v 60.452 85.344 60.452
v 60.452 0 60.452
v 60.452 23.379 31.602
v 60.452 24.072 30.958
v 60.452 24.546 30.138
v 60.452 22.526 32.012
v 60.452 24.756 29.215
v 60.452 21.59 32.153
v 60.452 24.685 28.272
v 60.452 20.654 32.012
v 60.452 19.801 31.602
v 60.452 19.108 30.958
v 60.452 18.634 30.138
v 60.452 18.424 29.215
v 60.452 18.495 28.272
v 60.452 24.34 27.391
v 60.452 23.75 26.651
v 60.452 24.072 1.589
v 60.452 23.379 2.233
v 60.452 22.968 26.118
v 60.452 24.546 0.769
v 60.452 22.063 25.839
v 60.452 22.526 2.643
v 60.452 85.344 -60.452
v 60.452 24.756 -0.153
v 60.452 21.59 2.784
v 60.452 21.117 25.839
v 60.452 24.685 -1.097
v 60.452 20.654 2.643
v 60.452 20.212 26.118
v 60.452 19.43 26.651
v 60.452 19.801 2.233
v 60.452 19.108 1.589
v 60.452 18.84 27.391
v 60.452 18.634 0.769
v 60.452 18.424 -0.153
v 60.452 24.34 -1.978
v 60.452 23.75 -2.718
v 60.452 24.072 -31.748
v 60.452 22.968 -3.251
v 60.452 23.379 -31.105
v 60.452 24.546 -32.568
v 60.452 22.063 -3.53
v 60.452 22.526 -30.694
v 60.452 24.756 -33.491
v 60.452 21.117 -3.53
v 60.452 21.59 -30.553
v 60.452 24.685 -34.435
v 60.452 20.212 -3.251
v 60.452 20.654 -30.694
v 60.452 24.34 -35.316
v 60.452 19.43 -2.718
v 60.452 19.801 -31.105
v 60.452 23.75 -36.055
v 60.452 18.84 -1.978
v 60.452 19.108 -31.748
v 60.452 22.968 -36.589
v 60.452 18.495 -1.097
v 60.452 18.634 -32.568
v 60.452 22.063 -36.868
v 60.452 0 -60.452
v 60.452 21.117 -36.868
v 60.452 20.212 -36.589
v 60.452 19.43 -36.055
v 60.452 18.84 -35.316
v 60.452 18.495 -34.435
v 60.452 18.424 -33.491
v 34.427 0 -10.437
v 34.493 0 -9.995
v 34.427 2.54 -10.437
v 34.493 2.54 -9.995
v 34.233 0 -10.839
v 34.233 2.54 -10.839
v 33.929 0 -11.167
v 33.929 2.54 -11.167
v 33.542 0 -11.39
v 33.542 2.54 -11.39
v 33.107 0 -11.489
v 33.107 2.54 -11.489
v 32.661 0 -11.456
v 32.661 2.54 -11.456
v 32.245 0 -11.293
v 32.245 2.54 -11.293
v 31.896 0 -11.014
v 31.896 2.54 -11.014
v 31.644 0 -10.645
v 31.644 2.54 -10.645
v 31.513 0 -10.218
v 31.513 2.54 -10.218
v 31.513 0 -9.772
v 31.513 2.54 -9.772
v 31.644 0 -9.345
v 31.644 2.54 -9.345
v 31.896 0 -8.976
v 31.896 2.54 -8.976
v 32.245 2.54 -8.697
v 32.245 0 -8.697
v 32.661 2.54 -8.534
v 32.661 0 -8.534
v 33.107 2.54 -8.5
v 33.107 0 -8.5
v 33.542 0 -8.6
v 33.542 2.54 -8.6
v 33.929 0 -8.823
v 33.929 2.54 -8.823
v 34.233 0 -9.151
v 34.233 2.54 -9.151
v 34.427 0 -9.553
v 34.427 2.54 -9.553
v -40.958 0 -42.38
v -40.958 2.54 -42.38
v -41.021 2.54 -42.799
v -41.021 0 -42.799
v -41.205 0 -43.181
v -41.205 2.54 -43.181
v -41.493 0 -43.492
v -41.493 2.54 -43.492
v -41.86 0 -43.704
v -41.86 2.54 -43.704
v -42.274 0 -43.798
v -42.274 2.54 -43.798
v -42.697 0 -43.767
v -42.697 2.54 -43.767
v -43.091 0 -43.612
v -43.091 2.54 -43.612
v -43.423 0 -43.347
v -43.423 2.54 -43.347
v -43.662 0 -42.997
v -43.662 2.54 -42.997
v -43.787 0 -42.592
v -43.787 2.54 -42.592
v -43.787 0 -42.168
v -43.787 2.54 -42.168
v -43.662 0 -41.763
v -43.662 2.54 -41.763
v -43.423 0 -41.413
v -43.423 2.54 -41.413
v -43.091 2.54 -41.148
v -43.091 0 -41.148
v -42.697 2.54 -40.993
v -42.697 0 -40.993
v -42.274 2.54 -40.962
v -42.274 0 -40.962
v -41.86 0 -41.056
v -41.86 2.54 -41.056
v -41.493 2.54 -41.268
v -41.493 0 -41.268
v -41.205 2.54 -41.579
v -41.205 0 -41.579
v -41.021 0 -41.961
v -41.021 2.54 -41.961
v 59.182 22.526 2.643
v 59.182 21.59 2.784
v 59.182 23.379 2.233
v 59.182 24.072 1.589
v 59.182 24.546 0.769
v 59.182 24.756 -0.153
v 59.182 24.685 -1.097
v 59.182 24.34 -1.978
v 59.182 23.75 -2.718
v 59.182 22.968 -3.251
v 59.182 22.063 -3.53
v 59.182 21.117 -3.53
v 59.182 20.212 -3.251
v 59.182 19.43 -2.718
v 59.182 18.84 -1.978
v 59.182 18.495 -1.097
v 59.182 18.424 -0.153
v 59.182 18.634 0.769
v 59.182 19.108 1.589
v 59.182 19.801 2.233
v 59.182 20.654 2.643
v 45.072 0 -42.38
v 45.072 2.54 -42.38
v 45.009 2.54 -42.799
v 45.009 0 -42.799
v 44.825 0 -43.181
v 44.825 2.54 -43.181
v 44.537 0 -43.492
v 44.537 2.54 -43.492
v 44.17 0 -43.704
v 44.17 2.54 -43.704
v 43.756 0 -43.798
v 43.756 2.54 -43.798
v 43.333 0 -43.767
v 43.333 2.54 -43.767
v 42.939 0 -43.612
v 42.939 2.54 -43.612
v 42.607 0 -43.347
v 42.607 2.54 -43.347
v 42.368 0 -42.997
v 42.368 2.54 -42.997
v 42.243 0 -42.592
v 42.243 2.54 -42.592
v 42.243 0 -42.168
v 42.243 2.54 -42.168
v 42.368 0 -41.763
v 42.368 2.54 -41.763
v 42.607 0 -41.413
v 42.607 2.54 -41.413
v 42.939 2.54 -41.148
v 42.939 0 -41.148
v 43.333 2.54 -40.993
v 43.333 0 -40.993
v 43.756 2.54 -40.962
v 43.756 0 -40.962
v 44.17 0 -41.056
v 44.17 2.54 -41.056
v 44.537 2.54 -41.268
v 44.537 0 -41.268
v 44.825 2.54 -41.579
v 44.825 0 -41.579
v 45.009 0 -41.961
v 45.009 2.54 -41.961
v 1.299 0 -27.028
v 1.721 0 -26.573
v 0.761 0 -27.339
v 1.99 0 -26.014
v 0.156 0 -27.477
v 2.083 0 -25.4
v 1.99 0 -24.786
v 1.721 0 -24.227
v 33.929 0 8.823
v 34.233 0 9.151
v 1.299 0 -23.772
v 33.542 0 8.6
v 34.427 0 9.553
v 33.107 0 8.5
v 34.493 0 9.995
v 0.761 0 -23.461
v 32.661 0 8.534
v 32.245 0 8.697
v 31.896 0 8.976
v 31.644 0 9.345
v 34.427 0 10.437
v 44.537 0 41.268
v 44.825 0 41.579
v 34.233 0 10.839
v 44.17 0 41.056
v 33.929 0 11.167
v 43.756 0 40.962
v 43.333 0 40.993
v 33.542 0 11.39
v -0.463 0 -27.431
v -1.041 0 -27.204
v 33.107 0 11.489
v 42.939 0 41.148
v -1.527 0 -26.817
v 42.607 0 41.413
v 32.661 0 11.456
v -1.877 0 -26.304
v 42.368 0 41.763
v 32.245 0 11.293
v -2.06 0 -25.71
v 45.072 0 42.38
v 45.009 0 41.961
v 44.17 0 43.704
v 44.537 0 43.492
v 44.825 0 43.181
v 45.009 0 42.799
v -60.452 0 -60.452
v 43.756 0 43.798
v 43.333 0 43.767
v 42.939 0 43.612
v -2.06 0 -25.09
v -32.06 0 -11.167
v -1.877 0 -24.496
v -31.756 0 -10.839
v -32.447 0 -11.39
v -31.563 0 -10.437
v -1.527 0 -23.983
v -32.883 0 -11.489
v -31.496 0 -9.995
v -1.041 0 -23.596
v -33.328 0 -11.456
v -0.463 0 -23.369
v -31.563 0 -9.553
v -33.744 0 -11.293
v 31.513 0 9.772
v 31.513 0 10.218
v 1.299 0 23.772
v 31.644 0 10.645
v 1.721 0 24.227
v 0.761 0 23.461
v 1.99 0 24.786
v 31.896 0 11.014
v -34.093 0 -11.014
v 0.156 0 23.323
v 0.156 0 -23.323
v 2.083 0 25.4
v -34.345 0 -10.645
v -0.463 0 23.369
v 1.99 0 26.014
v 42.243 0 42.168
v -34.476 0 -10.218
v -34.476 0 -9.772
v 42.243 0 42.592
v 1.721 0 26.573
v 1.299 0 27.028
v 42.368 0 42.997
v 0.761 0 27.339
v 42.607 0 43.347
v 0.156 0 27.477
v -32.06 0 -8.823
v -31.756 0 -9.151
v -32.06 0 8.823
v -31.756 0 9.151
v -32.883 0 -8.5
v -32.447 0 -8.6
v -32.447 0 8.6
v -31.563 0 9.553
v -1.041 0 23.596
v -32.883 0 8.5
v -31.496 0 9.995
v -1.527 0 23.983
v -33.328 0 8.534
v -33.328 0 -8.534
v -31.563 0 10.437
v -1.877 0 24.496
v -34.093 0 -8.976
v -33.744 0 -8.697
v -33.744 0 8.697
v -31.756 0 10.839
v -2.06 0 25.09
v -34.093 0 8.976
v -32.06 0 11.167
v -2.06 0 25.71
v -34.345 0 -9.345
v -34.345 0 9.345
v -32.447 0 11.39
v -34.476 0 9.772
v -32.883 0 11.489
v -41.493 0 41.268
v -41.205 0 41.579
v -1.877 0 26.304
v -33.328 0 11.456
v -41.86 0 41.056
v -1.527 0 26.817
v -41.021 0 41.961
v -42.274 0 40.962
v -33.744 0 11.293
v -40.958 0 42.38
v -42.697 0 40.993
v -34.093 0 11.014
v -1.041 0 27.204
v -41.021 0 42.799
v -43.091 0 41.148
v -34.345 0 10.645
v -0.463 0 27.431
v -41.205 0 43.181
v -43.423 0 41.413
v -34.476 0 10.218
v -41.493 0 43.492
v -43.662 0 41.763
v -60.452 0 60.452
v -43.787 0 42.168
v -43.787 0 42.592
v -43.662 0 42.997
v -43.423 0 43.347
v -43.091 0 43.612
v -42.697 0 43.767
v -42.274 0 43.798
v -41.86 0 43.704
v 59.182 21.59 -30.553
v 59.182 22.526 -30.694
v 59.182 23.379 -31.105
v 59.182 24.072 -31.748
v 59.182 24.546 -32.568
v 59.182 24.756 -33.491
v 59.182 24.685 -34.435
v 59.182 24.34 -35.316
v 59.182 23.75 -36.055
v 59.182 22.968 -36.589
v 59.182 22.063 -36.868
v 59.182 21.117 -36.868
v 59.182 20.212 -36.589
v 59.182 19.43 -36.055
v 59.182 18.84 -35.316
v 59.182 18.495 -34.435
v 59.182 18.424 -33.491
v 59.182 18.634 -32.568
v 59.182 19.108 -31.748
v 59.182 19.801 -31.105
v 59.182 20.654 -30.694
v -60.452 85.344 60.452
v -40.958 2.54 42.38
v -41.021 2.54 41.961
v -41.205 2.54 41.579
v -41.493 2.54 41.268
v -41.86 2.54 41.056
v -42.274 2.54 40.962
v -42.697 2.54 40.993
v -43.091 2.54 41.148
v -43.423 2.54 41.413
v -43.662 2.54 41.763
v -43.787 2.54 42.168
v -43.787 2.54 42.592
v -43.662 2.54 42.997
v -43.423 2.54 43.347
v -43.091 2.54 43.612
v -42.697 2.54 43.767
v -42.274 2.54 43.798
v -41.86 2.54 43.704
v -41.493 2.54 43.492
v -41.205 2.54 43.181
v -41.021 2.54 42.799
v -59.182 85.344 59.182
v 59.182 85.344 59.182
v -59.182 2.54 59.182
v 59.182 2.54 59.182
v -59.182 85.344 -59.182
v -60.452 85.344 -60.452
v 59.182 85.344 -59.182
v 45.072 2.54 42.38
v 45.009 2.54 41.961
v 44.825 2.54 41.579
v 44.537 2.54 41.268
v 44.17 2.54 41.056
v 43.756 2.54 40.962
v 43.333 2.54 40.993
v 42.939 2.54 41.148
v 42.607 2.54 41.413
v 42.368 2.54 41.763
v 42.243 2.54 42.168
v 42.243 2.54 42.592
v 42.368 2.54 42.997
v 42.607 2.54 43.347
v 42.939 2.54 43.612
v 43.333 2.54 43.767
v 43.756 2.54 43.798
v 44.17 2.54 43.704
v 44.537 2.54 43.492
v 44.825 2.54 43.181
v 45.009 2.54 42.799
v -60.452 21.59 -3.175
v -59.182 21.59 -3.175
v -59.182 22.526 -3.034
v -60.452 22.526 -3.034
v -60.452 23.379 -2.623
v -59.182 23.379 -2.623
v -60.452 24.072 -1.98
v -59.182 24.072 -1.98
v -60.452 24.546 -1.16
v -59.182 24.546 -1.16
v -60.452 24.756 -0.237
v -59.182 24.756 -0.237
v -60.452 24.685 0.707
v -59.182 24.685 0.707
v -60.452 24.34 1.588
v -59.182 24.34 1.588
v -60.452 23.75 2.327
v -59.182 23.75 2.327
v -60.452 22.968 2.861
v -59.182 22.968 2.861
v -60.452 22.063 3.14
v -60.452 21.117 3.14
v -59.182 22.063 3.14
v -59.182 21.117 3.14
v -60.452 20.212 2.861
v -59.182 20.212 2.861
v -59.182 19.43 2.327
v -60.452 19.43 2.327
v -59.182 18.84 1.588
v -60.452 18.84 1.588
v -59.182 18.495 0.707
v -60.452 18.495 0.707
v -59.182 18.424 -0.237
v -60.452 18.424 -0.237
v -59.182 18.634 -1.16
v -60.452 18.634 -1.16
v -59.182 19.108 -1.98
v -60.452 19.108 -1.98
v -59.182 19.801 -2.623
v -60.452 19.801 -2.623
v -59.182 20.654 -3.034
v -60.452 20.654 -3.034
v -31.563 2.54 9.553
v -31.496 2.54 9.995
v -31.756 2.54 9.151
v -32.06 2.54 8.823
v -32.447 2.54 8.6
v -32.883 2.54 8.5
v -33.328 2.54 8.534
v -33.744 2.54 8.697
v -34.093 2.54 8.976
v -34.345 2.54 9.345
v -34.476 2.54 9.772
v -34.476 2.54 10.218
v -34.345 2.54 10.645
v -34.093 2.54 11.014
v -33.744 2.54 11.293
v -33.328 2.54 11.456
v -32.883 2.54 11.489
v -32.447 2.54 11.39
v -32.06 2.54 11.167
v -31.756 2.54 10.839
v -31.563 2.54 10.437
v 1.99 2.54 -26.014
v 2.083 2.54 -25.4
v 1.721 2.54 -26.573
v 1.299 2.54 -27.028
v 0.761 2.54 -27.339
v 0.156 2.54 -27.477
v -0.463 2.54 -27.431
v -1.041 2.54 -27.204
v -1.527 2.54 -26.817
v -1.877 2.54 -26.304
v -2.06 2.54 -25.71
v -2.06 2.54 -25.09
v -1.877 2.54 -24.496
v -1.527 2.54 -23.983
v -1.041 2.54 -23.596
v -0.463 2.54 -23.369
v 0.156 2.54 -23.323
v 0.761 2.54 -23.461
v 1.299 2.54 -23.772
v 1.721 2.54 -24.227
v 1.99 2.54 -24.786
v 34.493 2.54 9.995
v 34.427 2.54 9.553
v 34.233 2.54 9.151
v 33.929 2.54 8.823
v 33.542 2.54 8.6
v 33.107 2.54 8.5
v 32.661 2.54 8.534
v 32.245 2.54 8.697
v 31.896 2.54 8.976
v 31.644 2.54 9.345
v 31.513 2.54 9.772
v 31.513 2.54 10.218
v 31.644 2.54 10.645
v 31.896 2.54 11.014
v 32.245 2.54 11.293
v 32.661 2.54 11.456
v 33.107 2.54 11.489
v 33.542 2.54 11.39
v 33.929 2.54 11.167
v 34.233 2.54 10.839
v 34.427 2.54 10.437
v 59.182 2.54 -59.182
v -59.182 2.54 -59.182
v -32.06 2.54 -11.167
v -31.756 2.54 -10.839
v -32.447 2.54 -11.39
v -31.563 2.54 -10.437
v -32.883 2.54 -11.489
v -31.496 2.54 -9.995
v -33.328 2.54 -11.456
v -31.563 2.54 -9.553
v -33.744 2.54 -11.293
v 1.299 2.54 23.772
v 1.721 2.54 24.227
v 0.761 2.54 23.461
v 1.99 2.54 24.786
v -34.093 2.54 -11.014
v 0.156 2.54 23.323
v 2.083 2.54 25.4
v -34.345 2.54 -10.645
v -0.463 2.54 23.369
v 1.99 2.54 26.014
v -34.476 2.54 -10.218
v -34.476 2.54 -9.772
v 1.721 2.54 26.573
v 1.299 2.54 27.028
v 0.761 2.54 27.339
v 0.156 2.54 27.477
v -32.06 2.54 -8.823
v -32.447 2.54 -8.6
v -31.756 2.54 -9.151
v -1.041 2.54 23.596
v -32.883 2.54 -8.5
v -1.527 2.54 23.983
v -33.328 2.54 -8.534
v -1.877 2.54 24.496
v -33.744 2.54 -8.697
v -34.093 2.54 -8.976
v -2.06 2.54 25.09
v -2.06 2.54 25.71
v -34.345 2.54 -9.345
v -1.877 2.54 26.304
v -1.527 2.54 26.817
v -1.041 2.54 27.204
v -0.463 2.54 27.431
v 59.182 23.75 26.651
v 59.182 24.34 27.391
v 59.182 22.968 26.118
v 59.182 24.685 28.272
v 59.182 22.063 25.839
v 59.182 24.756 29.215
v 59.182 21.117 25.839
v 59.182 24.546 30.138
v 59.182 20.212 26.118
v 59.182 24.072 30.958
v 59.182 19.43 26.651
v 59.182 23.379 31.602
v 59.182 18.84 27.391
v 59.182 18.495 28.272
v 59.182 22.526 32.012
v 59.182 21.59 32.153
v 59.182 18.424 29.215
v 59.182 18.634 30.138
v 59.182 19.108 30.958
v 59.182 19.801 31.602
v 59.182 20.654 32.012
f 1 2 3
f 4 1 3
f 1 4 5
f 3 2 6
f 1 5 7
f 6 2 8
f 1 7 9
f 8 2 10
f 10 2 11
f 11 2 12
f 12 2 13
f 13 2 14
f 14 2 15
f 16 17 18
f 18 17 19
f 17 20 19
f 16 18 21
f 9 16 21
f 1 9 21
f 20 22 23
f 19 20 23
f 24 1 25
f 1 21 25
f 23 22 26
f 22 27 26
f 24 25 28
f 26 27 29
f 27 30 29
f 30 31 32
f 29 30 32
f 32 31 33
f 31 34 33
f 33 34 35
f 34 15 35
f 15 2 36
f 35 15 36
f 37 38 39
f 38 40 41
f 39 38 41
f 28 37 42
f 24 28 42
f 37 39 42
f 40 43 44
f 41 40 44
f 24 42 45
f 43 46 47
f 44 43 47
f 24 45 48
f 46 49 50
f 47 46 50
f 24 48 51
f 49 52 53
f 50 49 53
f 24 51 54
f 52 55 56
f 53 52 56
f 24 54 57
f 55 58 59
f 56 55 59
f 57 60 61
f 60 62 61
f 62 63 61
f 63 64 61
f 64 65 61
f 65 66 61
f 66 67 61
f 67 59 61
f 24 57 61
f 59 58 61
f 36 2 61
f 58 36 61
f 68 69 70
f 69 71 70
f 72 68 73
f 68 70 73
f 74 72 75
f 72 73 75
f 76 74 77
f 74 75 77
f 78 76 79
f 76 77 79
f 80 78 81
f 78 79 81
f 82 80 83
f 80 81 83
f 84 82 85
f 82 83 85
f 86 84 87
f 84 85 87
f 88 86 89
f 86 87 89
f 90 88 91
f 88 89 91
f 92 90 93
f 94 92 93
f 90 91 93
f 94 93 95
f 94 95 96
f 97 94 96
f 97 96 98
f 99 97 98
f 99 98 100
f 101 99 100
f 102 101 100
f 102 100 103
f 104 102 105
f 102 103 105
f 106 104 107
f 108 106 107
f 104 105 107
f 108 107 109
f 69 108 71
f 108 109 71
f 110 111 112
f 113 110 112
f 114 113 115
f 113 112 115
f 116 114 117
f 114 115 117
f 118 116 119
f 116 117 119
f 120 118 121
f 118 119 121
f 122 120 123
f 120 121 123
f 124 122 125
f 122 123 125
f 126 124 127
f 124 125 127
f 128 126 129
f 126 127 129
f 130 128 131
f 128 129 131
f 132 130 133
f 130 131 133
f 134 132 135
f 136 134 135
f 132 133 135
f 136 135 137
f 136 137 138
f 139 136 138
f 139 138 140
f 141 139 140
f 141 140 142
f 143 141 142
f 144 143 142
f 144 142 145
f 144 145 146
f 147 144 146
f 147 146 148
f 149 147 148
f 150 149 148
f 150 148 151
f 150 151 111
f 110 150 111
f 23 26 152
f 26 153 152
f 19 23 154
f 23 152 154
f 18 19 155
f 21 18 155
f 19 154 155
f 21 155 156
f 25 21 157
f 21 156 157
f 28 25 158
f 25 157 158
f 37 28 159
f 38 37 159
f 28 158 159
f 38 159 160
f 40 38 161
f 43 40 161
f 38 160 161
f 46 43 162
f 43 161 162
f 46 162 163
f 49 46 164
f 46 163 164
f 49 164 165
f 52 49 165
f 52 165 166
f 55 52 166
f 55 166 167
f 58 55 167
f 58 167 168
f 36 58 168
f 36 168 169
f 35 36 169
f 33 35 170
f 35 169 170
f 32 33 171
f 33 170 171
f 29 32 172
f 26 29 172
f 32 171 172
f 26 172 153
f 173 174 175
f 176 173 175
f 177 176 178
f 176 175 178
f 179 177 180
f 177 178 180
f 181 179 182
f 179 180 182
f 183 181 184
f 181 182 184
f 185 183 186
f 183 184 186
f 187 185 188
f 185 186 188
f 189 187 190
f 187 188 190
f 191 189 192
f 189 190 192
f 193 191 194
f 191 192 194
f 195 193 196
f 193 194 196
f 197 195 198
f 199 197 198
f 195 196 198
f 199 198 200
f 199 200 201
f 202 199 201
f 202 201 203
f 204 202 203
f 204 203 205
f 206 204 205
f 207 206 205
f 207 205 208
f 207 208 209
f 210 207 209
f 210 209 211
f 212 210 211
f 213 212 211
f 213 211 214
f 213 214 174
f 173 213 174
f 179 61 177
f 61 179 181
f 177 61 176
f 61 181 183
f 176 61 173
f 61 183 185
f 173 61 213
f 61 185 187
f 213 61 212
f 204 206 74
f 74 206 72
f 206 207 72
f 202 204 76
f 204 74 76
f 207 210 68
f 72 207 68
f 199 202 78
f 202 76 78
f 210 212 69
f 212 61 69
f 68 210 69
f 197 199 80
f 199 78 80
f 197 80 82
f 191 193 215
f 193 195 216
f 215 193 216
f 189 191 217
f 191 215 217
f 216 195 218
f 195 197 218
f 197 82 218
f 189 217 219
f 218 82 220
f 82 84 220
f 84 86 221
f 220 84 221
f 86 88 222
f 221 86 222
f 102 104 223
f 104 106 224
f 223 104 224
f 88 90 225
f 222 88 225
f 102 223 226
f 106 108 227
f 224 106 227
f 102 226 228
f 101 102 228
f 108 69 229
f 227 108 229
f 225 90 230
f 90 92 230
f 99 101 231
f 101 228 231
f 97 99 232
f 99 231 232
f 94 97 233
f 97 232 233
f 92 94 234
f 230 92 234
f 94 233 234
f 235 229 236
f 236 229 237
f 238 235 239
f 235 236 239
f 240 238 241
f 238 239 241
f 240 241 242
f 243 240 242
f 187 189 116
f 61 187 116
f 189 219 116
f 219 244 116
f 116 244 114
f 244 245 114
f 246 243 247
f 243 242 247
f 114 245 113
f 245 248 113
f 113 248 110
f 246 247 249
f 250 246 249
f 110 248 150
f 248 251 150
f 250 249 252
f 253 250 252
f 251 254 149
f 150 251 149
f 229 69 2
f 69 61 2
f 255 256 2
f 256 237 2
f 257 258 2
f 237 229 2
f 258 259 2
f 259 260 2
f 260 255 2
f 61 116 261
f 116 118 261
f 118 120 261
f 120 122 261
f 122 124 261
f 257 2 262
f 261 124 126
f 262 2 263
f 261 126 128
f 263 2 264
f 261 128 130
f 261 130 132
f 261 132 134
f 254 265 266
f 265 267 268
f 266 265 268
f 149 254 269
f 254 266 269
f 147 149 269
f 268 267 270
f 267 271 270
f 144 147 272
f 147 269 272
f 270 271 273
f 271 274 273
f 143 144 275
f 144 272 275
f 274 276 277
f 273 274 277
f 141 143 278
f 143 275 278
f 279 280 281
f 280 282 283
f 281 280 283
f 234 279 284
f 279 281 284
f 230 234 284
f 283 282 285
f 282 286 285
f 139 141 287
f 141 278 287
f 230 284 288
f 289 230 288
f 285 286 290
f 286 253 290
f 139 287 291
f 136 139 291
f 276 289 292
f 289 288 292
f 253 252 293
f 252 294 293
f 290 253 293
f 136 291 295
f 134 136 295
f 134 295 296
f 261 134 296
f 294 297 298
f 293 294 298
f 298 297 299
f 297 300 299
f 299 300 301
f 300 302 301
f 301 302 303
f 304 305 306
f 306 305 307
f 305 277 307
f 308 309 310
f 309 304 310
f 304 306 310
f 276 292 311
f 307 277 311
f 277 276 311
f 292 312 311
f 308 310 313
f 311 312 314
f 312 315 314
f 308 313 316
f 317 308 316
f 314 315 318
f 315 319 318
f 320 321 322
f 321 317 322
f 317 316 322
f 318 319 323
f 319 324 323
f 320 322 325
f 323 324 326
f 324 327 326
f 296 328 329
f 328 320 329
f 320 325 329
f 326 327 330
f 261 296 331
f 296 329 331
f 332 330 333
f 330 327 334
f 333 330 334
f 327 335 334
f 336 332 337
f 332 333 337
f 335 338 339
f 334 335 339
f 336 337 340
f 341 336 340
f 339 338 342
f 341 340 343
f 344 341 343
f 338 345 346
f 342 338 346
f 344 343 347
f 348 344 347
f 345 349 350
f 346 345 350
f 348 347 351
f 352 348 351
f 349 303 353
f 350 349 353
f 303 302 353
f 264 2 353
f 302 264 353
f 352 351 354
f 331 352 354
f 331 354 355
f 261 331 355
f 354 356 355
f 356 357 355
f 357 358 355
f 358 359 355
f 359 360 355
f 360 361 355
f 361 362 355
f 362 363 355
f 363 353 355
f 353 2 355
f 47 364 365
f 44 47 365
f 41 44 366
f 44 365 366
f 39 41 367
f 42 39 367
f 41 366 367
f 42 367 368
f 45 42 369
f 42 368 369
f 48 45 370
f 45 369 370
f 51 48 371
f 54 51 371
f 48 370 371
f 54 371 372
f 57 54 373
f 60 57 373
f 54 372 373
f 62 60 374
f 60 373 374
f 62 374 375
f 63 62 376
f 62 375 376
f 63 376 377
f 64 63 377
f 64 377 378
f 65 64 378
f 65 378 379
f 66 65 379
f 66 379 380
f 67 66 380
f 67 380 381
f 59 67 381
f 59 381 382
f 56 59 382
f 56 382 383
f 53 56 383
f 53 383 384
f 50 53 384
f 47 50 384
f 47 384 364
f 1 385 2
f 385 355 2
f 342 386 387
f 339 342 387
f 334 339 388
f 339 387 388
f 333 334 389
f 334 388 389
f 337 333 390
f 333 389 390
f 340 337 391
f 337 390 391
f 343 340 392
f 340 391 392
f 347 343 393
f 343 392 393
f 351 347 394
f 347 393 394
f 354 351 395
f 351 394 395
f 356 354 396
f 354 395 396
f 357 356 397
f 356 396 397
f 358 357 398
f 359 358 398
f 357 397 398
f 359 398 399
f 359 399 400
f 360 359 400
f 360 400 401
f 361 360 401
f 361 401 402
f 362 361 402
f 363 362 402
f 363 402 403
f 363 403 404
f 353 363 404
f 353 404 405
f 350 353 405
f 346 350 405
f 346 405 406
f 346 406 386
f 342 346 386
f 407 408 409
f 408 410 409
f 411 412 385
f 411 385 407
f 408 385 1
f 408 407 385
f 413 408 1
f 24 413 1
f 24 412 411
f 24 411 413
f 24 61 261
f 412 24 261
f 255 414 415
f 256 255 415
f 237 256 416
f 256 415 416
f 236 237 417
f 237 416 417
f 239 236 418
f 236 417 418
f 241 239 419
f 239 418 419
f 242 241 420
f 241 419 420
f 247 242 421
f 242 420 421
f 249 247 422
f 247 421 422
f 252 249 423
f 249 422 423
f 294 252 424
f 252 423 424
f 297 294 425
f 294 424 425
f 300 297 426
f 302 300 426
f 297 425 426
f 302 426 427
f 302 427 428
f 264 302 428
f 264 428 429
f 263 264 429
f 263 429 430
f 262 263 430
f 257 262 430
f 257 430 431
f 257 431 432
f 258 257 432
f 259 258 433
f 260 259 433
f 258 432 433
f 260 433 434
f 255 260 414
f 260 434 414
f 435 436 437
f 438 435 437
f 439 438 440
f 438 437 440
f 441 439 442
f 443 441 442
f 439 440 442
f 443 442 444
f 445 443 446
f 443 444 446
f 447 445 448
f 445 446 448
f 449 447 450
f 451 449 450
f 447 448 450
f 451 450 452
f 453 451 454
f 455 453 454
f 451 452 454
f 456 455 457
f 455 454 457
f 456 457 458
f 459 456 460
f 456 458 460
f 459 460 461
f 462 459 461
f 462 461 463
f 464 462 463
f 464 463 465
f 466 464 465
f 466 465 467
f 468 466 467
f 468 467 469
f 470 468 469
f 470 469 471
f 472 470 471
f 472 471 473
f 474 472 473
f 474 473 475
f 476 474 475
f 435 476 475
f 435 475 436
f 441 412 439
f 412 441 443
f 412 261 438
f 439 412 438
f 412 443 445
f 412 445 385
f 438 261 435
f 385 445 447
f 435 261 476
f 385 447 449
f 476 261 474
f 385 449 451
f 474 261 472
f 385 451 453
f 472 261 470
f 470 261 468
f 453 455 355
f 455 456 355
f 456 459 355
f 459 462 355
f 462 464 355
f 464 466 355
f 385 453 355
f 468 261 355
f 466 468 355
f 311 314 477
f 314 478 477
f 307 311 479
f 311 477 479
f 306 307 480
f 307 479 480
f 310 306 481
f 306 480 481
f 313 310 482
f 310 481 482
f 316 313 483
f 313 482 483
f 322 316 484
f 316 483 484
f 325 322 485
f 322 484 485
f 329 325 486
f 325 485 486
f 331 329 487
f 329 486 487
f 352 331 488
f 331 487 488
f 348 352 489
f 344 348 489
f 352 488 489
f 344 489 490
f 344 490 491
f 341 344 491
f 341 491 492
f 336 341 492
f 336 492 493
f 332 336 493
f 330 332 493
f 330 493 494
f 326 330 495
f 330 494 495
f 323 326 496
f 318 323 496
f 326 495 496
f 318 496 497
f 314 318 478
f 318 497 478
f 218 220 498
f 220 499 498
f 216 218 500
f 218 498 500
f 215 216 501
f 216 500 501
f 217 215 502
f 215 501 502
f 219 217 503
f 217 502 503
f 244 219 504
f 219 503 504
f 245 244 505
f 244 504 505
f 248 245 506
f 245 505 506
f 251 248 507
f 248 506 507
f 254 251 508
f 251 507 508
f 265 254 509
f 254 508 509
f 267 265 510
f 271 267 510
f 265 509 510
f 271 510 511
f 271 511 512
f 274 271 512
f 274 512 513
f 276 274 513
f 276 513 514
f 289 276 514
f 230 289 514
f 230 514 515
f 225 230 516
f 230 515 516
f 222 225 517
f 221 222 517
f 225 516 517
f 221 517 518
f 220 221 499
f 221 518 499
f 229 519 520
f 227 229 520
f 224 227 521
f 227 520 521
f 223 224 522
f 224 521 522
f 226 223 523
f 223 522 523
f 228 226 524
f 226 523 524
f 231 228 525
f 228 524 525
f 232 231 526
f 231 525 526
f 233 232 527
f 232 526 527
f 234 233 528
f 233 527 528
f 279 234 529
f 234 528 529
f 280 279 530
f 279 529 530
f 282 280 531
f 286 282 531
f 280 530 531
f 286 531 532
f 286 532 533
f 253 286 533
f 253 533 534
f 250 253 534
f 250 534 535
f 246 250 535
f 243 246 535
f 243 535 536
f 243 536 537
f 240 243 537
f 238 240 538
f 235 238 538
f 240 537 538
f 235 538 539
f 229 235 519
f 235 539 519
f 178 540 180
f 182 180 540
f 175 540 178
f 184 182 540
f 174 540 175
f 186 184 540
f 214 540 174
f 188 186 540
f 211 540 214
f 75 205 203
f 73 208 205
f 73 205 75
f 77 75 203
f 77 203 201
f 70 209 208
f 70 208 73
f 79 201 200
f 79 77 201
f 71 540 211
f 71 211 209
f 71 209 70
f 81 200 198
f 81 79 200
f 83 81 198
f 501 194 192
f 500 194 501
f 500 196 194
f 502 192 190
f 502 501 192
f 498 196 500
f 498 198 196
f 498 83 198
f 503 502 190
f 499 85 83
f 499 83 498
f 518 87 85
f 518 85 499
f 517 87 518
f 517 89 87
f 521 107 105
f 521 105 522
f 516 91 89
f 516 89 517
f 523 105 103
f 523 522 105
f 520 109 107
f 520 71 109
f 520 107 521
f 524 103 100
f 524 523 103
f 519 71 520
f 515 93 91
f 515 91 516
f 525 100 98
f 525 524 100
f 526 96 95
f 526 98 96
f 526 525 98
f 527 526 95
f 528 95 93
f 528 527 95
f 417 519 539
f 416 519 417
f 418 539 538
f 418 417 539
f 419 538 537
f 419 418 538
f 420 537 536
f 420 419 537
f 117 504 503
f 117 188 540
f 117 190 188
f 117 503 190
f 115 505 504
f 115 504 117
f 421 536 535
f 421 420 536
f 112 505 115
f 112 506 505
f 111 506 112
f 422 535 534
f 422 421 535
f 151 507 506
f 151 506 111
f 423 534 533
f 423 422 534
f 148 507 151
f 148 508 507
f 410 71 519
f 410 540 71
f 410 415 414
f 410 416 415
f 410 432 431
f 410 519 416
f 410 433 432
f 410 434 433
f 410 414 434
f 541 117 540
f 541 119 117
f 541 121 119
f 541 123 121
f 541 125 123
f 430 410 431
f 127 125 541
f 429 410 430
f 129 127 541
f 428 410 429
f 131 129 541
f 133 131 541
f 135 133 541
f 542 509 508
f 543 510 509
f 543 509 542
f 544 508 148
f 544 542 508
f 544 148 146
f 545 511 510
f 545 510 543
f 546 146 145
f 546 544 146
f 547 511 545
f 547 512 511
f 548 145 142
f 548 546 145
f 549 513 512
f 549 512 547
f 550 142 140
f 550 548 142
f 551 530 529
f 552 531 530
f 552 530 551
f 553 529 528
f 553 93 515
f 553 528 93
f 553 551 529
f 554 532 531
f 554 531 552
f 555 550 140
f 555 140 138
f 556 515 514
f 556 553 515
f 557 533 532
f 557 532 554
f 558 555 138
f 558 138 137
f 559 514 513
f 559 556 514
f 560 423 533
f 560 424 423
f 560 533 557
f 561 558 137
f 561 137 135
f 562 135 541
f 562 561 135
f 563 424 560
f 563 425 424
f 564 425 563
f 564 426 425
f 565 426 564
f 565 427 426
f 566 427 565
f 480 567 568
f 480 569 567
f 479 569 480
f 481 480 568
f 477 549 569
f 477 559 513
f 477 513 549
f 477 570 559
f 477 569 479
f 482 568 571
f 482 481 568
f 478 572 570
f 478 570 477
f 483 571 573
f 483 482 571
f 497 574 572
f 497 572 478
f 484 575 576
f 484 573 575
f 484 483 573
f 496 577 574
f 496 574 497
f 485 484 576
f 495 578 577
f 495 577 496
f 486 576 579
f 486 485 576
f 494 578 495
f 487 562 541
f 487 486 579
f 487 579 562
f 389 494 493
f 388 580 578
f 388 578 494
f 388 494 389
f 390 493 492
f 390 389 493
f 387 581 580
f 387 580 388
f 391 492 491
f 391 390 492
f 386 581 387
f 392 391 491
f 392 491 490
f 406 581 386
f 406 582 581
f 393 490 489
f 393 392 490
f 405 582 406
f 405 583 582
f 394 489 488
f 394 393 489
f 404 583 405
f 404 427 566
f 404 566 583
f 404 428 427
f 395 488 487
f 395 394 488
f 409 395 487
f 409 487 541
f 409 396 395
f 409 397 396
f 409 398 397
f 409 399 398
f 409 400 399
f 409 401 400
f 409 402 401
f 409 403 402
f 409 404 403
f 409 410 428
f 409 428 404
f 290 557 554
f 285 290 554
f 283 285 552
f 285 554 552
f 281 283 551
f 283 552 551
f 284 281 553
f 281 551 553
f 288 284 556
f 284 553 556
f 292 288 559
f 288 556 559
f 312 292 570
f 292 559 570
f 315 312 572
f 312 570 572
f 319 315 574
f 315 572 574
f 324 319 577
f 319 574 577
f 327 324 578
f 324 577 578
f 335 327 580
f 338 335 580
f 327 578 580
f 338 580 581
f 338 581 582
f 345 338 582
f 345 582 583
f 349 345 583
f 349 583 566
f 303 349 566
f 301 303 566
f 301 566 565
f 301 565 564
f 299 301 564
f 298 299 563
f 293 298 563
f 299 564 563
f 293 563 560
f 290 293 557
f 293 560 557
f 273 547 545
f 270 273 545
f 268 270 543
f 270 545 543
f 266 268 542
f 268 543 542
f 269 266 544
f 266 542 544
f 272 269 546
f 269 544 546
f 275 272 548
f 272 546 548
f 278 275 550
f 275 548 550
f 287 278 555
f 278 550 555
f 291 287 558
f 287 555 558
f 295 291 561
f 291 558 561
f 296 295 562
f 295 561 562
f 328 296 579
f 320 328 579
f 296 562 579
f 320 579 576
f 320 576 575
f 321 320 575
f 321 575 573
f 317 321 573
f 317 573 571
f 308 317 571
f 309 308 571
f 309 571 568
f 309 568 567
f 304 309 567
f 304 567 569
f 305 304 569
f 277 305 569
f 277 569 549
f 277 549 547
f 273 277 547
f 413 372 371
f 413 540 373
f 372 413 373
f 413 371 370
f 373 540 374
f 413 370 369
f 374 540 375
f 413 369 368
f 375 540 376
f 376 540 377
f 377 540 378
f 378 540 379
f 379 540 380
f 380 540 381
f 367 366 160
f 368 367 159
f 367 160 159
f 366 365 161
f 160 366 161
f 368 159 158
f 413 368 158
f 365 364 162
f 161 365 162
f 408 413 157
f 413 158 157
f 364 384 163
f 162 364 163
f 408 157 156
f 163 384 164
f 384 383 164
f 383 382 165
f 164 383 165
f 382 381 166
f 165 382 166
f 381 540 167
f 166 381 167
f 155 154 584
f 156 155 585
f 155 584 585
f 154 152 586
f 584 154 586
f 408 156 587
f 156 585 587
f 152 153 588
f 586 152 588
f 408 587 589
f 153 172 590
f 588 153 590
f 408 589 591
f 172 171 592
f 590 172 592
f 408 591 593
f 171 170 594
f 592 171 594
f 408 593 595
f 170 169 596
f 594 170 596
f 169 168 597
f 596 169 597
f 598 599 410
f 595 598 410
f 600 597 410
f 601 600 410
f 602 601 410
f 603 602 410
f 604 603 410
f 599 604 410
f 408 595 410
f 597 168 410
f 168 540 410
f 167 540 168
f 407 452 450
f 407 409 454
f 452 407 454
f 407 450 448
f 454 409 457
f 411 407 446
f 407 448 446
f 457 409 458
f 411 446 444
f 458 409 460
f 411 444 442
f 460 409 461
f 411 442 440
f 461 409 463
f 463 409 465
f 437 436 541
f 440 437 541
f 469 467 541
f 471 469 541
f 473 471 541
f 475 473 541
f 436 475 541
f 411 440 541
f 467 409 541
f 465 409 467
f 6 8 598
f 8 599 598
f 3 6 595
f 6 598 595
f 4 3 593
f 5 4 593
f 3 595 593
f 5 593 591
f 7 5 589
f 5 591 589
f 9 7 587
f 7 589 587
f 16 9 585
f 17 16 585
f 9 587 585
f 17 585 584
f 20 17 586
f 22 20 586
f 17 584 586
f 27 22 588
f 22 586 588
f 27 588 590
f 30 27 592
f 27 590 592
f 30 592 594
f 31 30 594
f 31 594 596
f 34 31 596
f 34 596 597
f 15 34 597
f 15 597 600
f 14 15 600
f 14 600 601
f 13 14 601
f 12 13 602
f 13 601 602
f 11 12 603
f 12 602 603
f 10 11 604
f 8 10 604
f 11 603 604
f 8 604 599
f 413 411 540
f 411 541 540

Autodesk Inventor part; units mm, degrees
ref_plane "YZ Plane" through (0, 0, 0) normal (1, 0, 0) x (0, 1, 0)
ref_plane "XZ Plane" through (0, 0, 0) normal (0, 1, 0) x (-1, 0, 0)
ref_plane "XY Plane" through (0, 0, 0) normal (0, 0, 1) x (1, 0, 0)
sketch "Sketch1" plane through (0, 0, 0) normal (0, 1, 0) x (-1, 0, 0)
  line L0 (-60.452, -60.452) -> (60.452, -60.452)
  line L1 (60.452, -60.452) -> (60.452, 60.452)
  line L2 (60.452, 60.452) -> (-60.452, 60.452)
  line L3 (-60.452, 60.452) -> (-60.452, -60.452)
  line L4 (-60.452, -60.452) -> (60.452, 60.452) construction
  line L5 (60.452, -60.452) -> (-60.452, 60.452) construction
  point P0 (0, 0)
  dimension "d0" = 120.904
  dimension "d1" = 120.904
extrude "Extrusion1" add sketch "Sketch1" along normal blind 2.54
sketch "Sketch2" plane through (0, 2.54, 0) normal (0, 1, 0) x (1, 0, 0)
  line L0 (60.452, 60.452) -> (-60.452, 60.452) projected
  line L1 (60.452, -60.452) -> (-60.452, -60.452)
  line L2 (-60.452, -60.452) -> (-60.452, 60.452)
  line L3 (-60.452, 60.452) -> (60.452, 60.452)
  line L4 (60.452, 60.452) -> (60.452, -60.452)
  line L5 (60.452, -60.452) -> (-60.452, 60.452) construction
  line L6 (-60.452, -60.452) -> (60.452, 60.452) construction
  line L7 (59.182, -59.182) -> (-59.182, -59.182)
  line L8 (-59.182, -59.182) -> (-59.182, 59.182)
  line L9 (-59.182, 59.182) -> (59.182, 59.182)
  line L10 (59.182, 59.182) -> (59.182, -59.182)
  line L11 (59.182, -59.182) -> (-59.182, 59.182) construction
  line L12 (-59.182, -59.182) -> (59.182, 59.182) construction
  point P0 (0, 0)
  dimension "d4" = 118.364
  dimension "d5" = 118.364
extrude "Extrusion2" add sketch "Sketch2" along normal blind 82.804
sketch "Sketch3" plane through (0, 2.54, 0) normal (0, 1, 0) x (1, 0, 0)
  circle A0 centre (0, -25.4) radius 2.0828
  circle A1 centre (0, 25.4) radius 2.0828
  point P0 (0, 0)
  dimension "d10" = 4.1656
  dimension "d11" = 4.1656
extrude "Extrusion3" cut sketch "Sketch3" against normal through all
sketch "Sketch4" plane through (0, 2.54, 0) normal (0, 1, 0) x (1, 0, 0)
  line L0 (32.9946, -9.9949) -> (-32.9946, 9.9949) construction
  line L1 (-32.9946, -9.9949) -> (32.9946, 9.9949) construction
  circle A0 centre (-32.9946, -9.9949) radius 1.4986
  circle A1 centre (-32.9946, 9.9949) radius 1.4986
  circle A2 centre (32.9946, -9.9949) radius 1.4986
  circle A3 centre (32.9946, 9.9949) radius 1.4986
  line L2 (50, -50) -> (-50, 50) construction
  line L3 (-50, -50) -> (50, 50) construction
  circle A4 centre (43.65, -42.38) radius 1.4224
  circle A5 centre (43.65, 42.38) radius 1.4224
  circle A6 centre (-42.38, 42.38) radius 1.4224
  circle A7 centre (-42.38, -42.38) radius 1.4224
  point P0 (0, 0)
  dimension "d14" = 65.9892
  dimension "d15" = 19.9898
  dimension "d16" = 2.9972
  dimension "d17" = 2.9972
  dimension "d18" = 2.9972
  dimension "d19" = 2.9972
  dimension "d20" = 100
  dimension "d21" = 100
  dimension "d28" = 2.8448
  dimension "d29" = 2.8448
  dimension "d30" = 2.8448
  dimension "d31" = 2.8448
extrude "Extrusion4" cut sketch "Sketch4" against normal through all
sketch "Sketch5" plane through (-59.182, 2.54, 59.182) normal (1, 0, 0) x (0, 0, -1)
  line L0 (0, 0) -> (0, 82.804) projected
  circle A0 centre (59.182, 19.05) radius 3.175
  point P0 (59.182, -2.54)
  dimension "d34" = 6.35
extrude "Extrusion5" cut sketch "Sketch5" against normal through all
sketch "Sketch7" plane through (59.182, 2.54, -59.182) normal (-1, 0, 0) x (0, 0, 1)
  line L0 (0, 0) -> (0, 82.804) projected
  line L1 (0, 19.05) -> (9.1821, 19.05) construction
  circle A0 centre (25.454, 19.05) radius 3.175
  circle A1 centre (58.7915, 19.05) radius 3.175
  circle A2 centre (88.1602, 19.05) radius 3.175
  point P0 (59.182, -2.54)
  dimension "d50" = 6.35
  dimension "d51" = 6.35
  dimension "d52" = 6.35
extrude "Extrusion6" cut sketch "Sketch7" against normal through all
properties part number "546-1550Z137-Combiner"
